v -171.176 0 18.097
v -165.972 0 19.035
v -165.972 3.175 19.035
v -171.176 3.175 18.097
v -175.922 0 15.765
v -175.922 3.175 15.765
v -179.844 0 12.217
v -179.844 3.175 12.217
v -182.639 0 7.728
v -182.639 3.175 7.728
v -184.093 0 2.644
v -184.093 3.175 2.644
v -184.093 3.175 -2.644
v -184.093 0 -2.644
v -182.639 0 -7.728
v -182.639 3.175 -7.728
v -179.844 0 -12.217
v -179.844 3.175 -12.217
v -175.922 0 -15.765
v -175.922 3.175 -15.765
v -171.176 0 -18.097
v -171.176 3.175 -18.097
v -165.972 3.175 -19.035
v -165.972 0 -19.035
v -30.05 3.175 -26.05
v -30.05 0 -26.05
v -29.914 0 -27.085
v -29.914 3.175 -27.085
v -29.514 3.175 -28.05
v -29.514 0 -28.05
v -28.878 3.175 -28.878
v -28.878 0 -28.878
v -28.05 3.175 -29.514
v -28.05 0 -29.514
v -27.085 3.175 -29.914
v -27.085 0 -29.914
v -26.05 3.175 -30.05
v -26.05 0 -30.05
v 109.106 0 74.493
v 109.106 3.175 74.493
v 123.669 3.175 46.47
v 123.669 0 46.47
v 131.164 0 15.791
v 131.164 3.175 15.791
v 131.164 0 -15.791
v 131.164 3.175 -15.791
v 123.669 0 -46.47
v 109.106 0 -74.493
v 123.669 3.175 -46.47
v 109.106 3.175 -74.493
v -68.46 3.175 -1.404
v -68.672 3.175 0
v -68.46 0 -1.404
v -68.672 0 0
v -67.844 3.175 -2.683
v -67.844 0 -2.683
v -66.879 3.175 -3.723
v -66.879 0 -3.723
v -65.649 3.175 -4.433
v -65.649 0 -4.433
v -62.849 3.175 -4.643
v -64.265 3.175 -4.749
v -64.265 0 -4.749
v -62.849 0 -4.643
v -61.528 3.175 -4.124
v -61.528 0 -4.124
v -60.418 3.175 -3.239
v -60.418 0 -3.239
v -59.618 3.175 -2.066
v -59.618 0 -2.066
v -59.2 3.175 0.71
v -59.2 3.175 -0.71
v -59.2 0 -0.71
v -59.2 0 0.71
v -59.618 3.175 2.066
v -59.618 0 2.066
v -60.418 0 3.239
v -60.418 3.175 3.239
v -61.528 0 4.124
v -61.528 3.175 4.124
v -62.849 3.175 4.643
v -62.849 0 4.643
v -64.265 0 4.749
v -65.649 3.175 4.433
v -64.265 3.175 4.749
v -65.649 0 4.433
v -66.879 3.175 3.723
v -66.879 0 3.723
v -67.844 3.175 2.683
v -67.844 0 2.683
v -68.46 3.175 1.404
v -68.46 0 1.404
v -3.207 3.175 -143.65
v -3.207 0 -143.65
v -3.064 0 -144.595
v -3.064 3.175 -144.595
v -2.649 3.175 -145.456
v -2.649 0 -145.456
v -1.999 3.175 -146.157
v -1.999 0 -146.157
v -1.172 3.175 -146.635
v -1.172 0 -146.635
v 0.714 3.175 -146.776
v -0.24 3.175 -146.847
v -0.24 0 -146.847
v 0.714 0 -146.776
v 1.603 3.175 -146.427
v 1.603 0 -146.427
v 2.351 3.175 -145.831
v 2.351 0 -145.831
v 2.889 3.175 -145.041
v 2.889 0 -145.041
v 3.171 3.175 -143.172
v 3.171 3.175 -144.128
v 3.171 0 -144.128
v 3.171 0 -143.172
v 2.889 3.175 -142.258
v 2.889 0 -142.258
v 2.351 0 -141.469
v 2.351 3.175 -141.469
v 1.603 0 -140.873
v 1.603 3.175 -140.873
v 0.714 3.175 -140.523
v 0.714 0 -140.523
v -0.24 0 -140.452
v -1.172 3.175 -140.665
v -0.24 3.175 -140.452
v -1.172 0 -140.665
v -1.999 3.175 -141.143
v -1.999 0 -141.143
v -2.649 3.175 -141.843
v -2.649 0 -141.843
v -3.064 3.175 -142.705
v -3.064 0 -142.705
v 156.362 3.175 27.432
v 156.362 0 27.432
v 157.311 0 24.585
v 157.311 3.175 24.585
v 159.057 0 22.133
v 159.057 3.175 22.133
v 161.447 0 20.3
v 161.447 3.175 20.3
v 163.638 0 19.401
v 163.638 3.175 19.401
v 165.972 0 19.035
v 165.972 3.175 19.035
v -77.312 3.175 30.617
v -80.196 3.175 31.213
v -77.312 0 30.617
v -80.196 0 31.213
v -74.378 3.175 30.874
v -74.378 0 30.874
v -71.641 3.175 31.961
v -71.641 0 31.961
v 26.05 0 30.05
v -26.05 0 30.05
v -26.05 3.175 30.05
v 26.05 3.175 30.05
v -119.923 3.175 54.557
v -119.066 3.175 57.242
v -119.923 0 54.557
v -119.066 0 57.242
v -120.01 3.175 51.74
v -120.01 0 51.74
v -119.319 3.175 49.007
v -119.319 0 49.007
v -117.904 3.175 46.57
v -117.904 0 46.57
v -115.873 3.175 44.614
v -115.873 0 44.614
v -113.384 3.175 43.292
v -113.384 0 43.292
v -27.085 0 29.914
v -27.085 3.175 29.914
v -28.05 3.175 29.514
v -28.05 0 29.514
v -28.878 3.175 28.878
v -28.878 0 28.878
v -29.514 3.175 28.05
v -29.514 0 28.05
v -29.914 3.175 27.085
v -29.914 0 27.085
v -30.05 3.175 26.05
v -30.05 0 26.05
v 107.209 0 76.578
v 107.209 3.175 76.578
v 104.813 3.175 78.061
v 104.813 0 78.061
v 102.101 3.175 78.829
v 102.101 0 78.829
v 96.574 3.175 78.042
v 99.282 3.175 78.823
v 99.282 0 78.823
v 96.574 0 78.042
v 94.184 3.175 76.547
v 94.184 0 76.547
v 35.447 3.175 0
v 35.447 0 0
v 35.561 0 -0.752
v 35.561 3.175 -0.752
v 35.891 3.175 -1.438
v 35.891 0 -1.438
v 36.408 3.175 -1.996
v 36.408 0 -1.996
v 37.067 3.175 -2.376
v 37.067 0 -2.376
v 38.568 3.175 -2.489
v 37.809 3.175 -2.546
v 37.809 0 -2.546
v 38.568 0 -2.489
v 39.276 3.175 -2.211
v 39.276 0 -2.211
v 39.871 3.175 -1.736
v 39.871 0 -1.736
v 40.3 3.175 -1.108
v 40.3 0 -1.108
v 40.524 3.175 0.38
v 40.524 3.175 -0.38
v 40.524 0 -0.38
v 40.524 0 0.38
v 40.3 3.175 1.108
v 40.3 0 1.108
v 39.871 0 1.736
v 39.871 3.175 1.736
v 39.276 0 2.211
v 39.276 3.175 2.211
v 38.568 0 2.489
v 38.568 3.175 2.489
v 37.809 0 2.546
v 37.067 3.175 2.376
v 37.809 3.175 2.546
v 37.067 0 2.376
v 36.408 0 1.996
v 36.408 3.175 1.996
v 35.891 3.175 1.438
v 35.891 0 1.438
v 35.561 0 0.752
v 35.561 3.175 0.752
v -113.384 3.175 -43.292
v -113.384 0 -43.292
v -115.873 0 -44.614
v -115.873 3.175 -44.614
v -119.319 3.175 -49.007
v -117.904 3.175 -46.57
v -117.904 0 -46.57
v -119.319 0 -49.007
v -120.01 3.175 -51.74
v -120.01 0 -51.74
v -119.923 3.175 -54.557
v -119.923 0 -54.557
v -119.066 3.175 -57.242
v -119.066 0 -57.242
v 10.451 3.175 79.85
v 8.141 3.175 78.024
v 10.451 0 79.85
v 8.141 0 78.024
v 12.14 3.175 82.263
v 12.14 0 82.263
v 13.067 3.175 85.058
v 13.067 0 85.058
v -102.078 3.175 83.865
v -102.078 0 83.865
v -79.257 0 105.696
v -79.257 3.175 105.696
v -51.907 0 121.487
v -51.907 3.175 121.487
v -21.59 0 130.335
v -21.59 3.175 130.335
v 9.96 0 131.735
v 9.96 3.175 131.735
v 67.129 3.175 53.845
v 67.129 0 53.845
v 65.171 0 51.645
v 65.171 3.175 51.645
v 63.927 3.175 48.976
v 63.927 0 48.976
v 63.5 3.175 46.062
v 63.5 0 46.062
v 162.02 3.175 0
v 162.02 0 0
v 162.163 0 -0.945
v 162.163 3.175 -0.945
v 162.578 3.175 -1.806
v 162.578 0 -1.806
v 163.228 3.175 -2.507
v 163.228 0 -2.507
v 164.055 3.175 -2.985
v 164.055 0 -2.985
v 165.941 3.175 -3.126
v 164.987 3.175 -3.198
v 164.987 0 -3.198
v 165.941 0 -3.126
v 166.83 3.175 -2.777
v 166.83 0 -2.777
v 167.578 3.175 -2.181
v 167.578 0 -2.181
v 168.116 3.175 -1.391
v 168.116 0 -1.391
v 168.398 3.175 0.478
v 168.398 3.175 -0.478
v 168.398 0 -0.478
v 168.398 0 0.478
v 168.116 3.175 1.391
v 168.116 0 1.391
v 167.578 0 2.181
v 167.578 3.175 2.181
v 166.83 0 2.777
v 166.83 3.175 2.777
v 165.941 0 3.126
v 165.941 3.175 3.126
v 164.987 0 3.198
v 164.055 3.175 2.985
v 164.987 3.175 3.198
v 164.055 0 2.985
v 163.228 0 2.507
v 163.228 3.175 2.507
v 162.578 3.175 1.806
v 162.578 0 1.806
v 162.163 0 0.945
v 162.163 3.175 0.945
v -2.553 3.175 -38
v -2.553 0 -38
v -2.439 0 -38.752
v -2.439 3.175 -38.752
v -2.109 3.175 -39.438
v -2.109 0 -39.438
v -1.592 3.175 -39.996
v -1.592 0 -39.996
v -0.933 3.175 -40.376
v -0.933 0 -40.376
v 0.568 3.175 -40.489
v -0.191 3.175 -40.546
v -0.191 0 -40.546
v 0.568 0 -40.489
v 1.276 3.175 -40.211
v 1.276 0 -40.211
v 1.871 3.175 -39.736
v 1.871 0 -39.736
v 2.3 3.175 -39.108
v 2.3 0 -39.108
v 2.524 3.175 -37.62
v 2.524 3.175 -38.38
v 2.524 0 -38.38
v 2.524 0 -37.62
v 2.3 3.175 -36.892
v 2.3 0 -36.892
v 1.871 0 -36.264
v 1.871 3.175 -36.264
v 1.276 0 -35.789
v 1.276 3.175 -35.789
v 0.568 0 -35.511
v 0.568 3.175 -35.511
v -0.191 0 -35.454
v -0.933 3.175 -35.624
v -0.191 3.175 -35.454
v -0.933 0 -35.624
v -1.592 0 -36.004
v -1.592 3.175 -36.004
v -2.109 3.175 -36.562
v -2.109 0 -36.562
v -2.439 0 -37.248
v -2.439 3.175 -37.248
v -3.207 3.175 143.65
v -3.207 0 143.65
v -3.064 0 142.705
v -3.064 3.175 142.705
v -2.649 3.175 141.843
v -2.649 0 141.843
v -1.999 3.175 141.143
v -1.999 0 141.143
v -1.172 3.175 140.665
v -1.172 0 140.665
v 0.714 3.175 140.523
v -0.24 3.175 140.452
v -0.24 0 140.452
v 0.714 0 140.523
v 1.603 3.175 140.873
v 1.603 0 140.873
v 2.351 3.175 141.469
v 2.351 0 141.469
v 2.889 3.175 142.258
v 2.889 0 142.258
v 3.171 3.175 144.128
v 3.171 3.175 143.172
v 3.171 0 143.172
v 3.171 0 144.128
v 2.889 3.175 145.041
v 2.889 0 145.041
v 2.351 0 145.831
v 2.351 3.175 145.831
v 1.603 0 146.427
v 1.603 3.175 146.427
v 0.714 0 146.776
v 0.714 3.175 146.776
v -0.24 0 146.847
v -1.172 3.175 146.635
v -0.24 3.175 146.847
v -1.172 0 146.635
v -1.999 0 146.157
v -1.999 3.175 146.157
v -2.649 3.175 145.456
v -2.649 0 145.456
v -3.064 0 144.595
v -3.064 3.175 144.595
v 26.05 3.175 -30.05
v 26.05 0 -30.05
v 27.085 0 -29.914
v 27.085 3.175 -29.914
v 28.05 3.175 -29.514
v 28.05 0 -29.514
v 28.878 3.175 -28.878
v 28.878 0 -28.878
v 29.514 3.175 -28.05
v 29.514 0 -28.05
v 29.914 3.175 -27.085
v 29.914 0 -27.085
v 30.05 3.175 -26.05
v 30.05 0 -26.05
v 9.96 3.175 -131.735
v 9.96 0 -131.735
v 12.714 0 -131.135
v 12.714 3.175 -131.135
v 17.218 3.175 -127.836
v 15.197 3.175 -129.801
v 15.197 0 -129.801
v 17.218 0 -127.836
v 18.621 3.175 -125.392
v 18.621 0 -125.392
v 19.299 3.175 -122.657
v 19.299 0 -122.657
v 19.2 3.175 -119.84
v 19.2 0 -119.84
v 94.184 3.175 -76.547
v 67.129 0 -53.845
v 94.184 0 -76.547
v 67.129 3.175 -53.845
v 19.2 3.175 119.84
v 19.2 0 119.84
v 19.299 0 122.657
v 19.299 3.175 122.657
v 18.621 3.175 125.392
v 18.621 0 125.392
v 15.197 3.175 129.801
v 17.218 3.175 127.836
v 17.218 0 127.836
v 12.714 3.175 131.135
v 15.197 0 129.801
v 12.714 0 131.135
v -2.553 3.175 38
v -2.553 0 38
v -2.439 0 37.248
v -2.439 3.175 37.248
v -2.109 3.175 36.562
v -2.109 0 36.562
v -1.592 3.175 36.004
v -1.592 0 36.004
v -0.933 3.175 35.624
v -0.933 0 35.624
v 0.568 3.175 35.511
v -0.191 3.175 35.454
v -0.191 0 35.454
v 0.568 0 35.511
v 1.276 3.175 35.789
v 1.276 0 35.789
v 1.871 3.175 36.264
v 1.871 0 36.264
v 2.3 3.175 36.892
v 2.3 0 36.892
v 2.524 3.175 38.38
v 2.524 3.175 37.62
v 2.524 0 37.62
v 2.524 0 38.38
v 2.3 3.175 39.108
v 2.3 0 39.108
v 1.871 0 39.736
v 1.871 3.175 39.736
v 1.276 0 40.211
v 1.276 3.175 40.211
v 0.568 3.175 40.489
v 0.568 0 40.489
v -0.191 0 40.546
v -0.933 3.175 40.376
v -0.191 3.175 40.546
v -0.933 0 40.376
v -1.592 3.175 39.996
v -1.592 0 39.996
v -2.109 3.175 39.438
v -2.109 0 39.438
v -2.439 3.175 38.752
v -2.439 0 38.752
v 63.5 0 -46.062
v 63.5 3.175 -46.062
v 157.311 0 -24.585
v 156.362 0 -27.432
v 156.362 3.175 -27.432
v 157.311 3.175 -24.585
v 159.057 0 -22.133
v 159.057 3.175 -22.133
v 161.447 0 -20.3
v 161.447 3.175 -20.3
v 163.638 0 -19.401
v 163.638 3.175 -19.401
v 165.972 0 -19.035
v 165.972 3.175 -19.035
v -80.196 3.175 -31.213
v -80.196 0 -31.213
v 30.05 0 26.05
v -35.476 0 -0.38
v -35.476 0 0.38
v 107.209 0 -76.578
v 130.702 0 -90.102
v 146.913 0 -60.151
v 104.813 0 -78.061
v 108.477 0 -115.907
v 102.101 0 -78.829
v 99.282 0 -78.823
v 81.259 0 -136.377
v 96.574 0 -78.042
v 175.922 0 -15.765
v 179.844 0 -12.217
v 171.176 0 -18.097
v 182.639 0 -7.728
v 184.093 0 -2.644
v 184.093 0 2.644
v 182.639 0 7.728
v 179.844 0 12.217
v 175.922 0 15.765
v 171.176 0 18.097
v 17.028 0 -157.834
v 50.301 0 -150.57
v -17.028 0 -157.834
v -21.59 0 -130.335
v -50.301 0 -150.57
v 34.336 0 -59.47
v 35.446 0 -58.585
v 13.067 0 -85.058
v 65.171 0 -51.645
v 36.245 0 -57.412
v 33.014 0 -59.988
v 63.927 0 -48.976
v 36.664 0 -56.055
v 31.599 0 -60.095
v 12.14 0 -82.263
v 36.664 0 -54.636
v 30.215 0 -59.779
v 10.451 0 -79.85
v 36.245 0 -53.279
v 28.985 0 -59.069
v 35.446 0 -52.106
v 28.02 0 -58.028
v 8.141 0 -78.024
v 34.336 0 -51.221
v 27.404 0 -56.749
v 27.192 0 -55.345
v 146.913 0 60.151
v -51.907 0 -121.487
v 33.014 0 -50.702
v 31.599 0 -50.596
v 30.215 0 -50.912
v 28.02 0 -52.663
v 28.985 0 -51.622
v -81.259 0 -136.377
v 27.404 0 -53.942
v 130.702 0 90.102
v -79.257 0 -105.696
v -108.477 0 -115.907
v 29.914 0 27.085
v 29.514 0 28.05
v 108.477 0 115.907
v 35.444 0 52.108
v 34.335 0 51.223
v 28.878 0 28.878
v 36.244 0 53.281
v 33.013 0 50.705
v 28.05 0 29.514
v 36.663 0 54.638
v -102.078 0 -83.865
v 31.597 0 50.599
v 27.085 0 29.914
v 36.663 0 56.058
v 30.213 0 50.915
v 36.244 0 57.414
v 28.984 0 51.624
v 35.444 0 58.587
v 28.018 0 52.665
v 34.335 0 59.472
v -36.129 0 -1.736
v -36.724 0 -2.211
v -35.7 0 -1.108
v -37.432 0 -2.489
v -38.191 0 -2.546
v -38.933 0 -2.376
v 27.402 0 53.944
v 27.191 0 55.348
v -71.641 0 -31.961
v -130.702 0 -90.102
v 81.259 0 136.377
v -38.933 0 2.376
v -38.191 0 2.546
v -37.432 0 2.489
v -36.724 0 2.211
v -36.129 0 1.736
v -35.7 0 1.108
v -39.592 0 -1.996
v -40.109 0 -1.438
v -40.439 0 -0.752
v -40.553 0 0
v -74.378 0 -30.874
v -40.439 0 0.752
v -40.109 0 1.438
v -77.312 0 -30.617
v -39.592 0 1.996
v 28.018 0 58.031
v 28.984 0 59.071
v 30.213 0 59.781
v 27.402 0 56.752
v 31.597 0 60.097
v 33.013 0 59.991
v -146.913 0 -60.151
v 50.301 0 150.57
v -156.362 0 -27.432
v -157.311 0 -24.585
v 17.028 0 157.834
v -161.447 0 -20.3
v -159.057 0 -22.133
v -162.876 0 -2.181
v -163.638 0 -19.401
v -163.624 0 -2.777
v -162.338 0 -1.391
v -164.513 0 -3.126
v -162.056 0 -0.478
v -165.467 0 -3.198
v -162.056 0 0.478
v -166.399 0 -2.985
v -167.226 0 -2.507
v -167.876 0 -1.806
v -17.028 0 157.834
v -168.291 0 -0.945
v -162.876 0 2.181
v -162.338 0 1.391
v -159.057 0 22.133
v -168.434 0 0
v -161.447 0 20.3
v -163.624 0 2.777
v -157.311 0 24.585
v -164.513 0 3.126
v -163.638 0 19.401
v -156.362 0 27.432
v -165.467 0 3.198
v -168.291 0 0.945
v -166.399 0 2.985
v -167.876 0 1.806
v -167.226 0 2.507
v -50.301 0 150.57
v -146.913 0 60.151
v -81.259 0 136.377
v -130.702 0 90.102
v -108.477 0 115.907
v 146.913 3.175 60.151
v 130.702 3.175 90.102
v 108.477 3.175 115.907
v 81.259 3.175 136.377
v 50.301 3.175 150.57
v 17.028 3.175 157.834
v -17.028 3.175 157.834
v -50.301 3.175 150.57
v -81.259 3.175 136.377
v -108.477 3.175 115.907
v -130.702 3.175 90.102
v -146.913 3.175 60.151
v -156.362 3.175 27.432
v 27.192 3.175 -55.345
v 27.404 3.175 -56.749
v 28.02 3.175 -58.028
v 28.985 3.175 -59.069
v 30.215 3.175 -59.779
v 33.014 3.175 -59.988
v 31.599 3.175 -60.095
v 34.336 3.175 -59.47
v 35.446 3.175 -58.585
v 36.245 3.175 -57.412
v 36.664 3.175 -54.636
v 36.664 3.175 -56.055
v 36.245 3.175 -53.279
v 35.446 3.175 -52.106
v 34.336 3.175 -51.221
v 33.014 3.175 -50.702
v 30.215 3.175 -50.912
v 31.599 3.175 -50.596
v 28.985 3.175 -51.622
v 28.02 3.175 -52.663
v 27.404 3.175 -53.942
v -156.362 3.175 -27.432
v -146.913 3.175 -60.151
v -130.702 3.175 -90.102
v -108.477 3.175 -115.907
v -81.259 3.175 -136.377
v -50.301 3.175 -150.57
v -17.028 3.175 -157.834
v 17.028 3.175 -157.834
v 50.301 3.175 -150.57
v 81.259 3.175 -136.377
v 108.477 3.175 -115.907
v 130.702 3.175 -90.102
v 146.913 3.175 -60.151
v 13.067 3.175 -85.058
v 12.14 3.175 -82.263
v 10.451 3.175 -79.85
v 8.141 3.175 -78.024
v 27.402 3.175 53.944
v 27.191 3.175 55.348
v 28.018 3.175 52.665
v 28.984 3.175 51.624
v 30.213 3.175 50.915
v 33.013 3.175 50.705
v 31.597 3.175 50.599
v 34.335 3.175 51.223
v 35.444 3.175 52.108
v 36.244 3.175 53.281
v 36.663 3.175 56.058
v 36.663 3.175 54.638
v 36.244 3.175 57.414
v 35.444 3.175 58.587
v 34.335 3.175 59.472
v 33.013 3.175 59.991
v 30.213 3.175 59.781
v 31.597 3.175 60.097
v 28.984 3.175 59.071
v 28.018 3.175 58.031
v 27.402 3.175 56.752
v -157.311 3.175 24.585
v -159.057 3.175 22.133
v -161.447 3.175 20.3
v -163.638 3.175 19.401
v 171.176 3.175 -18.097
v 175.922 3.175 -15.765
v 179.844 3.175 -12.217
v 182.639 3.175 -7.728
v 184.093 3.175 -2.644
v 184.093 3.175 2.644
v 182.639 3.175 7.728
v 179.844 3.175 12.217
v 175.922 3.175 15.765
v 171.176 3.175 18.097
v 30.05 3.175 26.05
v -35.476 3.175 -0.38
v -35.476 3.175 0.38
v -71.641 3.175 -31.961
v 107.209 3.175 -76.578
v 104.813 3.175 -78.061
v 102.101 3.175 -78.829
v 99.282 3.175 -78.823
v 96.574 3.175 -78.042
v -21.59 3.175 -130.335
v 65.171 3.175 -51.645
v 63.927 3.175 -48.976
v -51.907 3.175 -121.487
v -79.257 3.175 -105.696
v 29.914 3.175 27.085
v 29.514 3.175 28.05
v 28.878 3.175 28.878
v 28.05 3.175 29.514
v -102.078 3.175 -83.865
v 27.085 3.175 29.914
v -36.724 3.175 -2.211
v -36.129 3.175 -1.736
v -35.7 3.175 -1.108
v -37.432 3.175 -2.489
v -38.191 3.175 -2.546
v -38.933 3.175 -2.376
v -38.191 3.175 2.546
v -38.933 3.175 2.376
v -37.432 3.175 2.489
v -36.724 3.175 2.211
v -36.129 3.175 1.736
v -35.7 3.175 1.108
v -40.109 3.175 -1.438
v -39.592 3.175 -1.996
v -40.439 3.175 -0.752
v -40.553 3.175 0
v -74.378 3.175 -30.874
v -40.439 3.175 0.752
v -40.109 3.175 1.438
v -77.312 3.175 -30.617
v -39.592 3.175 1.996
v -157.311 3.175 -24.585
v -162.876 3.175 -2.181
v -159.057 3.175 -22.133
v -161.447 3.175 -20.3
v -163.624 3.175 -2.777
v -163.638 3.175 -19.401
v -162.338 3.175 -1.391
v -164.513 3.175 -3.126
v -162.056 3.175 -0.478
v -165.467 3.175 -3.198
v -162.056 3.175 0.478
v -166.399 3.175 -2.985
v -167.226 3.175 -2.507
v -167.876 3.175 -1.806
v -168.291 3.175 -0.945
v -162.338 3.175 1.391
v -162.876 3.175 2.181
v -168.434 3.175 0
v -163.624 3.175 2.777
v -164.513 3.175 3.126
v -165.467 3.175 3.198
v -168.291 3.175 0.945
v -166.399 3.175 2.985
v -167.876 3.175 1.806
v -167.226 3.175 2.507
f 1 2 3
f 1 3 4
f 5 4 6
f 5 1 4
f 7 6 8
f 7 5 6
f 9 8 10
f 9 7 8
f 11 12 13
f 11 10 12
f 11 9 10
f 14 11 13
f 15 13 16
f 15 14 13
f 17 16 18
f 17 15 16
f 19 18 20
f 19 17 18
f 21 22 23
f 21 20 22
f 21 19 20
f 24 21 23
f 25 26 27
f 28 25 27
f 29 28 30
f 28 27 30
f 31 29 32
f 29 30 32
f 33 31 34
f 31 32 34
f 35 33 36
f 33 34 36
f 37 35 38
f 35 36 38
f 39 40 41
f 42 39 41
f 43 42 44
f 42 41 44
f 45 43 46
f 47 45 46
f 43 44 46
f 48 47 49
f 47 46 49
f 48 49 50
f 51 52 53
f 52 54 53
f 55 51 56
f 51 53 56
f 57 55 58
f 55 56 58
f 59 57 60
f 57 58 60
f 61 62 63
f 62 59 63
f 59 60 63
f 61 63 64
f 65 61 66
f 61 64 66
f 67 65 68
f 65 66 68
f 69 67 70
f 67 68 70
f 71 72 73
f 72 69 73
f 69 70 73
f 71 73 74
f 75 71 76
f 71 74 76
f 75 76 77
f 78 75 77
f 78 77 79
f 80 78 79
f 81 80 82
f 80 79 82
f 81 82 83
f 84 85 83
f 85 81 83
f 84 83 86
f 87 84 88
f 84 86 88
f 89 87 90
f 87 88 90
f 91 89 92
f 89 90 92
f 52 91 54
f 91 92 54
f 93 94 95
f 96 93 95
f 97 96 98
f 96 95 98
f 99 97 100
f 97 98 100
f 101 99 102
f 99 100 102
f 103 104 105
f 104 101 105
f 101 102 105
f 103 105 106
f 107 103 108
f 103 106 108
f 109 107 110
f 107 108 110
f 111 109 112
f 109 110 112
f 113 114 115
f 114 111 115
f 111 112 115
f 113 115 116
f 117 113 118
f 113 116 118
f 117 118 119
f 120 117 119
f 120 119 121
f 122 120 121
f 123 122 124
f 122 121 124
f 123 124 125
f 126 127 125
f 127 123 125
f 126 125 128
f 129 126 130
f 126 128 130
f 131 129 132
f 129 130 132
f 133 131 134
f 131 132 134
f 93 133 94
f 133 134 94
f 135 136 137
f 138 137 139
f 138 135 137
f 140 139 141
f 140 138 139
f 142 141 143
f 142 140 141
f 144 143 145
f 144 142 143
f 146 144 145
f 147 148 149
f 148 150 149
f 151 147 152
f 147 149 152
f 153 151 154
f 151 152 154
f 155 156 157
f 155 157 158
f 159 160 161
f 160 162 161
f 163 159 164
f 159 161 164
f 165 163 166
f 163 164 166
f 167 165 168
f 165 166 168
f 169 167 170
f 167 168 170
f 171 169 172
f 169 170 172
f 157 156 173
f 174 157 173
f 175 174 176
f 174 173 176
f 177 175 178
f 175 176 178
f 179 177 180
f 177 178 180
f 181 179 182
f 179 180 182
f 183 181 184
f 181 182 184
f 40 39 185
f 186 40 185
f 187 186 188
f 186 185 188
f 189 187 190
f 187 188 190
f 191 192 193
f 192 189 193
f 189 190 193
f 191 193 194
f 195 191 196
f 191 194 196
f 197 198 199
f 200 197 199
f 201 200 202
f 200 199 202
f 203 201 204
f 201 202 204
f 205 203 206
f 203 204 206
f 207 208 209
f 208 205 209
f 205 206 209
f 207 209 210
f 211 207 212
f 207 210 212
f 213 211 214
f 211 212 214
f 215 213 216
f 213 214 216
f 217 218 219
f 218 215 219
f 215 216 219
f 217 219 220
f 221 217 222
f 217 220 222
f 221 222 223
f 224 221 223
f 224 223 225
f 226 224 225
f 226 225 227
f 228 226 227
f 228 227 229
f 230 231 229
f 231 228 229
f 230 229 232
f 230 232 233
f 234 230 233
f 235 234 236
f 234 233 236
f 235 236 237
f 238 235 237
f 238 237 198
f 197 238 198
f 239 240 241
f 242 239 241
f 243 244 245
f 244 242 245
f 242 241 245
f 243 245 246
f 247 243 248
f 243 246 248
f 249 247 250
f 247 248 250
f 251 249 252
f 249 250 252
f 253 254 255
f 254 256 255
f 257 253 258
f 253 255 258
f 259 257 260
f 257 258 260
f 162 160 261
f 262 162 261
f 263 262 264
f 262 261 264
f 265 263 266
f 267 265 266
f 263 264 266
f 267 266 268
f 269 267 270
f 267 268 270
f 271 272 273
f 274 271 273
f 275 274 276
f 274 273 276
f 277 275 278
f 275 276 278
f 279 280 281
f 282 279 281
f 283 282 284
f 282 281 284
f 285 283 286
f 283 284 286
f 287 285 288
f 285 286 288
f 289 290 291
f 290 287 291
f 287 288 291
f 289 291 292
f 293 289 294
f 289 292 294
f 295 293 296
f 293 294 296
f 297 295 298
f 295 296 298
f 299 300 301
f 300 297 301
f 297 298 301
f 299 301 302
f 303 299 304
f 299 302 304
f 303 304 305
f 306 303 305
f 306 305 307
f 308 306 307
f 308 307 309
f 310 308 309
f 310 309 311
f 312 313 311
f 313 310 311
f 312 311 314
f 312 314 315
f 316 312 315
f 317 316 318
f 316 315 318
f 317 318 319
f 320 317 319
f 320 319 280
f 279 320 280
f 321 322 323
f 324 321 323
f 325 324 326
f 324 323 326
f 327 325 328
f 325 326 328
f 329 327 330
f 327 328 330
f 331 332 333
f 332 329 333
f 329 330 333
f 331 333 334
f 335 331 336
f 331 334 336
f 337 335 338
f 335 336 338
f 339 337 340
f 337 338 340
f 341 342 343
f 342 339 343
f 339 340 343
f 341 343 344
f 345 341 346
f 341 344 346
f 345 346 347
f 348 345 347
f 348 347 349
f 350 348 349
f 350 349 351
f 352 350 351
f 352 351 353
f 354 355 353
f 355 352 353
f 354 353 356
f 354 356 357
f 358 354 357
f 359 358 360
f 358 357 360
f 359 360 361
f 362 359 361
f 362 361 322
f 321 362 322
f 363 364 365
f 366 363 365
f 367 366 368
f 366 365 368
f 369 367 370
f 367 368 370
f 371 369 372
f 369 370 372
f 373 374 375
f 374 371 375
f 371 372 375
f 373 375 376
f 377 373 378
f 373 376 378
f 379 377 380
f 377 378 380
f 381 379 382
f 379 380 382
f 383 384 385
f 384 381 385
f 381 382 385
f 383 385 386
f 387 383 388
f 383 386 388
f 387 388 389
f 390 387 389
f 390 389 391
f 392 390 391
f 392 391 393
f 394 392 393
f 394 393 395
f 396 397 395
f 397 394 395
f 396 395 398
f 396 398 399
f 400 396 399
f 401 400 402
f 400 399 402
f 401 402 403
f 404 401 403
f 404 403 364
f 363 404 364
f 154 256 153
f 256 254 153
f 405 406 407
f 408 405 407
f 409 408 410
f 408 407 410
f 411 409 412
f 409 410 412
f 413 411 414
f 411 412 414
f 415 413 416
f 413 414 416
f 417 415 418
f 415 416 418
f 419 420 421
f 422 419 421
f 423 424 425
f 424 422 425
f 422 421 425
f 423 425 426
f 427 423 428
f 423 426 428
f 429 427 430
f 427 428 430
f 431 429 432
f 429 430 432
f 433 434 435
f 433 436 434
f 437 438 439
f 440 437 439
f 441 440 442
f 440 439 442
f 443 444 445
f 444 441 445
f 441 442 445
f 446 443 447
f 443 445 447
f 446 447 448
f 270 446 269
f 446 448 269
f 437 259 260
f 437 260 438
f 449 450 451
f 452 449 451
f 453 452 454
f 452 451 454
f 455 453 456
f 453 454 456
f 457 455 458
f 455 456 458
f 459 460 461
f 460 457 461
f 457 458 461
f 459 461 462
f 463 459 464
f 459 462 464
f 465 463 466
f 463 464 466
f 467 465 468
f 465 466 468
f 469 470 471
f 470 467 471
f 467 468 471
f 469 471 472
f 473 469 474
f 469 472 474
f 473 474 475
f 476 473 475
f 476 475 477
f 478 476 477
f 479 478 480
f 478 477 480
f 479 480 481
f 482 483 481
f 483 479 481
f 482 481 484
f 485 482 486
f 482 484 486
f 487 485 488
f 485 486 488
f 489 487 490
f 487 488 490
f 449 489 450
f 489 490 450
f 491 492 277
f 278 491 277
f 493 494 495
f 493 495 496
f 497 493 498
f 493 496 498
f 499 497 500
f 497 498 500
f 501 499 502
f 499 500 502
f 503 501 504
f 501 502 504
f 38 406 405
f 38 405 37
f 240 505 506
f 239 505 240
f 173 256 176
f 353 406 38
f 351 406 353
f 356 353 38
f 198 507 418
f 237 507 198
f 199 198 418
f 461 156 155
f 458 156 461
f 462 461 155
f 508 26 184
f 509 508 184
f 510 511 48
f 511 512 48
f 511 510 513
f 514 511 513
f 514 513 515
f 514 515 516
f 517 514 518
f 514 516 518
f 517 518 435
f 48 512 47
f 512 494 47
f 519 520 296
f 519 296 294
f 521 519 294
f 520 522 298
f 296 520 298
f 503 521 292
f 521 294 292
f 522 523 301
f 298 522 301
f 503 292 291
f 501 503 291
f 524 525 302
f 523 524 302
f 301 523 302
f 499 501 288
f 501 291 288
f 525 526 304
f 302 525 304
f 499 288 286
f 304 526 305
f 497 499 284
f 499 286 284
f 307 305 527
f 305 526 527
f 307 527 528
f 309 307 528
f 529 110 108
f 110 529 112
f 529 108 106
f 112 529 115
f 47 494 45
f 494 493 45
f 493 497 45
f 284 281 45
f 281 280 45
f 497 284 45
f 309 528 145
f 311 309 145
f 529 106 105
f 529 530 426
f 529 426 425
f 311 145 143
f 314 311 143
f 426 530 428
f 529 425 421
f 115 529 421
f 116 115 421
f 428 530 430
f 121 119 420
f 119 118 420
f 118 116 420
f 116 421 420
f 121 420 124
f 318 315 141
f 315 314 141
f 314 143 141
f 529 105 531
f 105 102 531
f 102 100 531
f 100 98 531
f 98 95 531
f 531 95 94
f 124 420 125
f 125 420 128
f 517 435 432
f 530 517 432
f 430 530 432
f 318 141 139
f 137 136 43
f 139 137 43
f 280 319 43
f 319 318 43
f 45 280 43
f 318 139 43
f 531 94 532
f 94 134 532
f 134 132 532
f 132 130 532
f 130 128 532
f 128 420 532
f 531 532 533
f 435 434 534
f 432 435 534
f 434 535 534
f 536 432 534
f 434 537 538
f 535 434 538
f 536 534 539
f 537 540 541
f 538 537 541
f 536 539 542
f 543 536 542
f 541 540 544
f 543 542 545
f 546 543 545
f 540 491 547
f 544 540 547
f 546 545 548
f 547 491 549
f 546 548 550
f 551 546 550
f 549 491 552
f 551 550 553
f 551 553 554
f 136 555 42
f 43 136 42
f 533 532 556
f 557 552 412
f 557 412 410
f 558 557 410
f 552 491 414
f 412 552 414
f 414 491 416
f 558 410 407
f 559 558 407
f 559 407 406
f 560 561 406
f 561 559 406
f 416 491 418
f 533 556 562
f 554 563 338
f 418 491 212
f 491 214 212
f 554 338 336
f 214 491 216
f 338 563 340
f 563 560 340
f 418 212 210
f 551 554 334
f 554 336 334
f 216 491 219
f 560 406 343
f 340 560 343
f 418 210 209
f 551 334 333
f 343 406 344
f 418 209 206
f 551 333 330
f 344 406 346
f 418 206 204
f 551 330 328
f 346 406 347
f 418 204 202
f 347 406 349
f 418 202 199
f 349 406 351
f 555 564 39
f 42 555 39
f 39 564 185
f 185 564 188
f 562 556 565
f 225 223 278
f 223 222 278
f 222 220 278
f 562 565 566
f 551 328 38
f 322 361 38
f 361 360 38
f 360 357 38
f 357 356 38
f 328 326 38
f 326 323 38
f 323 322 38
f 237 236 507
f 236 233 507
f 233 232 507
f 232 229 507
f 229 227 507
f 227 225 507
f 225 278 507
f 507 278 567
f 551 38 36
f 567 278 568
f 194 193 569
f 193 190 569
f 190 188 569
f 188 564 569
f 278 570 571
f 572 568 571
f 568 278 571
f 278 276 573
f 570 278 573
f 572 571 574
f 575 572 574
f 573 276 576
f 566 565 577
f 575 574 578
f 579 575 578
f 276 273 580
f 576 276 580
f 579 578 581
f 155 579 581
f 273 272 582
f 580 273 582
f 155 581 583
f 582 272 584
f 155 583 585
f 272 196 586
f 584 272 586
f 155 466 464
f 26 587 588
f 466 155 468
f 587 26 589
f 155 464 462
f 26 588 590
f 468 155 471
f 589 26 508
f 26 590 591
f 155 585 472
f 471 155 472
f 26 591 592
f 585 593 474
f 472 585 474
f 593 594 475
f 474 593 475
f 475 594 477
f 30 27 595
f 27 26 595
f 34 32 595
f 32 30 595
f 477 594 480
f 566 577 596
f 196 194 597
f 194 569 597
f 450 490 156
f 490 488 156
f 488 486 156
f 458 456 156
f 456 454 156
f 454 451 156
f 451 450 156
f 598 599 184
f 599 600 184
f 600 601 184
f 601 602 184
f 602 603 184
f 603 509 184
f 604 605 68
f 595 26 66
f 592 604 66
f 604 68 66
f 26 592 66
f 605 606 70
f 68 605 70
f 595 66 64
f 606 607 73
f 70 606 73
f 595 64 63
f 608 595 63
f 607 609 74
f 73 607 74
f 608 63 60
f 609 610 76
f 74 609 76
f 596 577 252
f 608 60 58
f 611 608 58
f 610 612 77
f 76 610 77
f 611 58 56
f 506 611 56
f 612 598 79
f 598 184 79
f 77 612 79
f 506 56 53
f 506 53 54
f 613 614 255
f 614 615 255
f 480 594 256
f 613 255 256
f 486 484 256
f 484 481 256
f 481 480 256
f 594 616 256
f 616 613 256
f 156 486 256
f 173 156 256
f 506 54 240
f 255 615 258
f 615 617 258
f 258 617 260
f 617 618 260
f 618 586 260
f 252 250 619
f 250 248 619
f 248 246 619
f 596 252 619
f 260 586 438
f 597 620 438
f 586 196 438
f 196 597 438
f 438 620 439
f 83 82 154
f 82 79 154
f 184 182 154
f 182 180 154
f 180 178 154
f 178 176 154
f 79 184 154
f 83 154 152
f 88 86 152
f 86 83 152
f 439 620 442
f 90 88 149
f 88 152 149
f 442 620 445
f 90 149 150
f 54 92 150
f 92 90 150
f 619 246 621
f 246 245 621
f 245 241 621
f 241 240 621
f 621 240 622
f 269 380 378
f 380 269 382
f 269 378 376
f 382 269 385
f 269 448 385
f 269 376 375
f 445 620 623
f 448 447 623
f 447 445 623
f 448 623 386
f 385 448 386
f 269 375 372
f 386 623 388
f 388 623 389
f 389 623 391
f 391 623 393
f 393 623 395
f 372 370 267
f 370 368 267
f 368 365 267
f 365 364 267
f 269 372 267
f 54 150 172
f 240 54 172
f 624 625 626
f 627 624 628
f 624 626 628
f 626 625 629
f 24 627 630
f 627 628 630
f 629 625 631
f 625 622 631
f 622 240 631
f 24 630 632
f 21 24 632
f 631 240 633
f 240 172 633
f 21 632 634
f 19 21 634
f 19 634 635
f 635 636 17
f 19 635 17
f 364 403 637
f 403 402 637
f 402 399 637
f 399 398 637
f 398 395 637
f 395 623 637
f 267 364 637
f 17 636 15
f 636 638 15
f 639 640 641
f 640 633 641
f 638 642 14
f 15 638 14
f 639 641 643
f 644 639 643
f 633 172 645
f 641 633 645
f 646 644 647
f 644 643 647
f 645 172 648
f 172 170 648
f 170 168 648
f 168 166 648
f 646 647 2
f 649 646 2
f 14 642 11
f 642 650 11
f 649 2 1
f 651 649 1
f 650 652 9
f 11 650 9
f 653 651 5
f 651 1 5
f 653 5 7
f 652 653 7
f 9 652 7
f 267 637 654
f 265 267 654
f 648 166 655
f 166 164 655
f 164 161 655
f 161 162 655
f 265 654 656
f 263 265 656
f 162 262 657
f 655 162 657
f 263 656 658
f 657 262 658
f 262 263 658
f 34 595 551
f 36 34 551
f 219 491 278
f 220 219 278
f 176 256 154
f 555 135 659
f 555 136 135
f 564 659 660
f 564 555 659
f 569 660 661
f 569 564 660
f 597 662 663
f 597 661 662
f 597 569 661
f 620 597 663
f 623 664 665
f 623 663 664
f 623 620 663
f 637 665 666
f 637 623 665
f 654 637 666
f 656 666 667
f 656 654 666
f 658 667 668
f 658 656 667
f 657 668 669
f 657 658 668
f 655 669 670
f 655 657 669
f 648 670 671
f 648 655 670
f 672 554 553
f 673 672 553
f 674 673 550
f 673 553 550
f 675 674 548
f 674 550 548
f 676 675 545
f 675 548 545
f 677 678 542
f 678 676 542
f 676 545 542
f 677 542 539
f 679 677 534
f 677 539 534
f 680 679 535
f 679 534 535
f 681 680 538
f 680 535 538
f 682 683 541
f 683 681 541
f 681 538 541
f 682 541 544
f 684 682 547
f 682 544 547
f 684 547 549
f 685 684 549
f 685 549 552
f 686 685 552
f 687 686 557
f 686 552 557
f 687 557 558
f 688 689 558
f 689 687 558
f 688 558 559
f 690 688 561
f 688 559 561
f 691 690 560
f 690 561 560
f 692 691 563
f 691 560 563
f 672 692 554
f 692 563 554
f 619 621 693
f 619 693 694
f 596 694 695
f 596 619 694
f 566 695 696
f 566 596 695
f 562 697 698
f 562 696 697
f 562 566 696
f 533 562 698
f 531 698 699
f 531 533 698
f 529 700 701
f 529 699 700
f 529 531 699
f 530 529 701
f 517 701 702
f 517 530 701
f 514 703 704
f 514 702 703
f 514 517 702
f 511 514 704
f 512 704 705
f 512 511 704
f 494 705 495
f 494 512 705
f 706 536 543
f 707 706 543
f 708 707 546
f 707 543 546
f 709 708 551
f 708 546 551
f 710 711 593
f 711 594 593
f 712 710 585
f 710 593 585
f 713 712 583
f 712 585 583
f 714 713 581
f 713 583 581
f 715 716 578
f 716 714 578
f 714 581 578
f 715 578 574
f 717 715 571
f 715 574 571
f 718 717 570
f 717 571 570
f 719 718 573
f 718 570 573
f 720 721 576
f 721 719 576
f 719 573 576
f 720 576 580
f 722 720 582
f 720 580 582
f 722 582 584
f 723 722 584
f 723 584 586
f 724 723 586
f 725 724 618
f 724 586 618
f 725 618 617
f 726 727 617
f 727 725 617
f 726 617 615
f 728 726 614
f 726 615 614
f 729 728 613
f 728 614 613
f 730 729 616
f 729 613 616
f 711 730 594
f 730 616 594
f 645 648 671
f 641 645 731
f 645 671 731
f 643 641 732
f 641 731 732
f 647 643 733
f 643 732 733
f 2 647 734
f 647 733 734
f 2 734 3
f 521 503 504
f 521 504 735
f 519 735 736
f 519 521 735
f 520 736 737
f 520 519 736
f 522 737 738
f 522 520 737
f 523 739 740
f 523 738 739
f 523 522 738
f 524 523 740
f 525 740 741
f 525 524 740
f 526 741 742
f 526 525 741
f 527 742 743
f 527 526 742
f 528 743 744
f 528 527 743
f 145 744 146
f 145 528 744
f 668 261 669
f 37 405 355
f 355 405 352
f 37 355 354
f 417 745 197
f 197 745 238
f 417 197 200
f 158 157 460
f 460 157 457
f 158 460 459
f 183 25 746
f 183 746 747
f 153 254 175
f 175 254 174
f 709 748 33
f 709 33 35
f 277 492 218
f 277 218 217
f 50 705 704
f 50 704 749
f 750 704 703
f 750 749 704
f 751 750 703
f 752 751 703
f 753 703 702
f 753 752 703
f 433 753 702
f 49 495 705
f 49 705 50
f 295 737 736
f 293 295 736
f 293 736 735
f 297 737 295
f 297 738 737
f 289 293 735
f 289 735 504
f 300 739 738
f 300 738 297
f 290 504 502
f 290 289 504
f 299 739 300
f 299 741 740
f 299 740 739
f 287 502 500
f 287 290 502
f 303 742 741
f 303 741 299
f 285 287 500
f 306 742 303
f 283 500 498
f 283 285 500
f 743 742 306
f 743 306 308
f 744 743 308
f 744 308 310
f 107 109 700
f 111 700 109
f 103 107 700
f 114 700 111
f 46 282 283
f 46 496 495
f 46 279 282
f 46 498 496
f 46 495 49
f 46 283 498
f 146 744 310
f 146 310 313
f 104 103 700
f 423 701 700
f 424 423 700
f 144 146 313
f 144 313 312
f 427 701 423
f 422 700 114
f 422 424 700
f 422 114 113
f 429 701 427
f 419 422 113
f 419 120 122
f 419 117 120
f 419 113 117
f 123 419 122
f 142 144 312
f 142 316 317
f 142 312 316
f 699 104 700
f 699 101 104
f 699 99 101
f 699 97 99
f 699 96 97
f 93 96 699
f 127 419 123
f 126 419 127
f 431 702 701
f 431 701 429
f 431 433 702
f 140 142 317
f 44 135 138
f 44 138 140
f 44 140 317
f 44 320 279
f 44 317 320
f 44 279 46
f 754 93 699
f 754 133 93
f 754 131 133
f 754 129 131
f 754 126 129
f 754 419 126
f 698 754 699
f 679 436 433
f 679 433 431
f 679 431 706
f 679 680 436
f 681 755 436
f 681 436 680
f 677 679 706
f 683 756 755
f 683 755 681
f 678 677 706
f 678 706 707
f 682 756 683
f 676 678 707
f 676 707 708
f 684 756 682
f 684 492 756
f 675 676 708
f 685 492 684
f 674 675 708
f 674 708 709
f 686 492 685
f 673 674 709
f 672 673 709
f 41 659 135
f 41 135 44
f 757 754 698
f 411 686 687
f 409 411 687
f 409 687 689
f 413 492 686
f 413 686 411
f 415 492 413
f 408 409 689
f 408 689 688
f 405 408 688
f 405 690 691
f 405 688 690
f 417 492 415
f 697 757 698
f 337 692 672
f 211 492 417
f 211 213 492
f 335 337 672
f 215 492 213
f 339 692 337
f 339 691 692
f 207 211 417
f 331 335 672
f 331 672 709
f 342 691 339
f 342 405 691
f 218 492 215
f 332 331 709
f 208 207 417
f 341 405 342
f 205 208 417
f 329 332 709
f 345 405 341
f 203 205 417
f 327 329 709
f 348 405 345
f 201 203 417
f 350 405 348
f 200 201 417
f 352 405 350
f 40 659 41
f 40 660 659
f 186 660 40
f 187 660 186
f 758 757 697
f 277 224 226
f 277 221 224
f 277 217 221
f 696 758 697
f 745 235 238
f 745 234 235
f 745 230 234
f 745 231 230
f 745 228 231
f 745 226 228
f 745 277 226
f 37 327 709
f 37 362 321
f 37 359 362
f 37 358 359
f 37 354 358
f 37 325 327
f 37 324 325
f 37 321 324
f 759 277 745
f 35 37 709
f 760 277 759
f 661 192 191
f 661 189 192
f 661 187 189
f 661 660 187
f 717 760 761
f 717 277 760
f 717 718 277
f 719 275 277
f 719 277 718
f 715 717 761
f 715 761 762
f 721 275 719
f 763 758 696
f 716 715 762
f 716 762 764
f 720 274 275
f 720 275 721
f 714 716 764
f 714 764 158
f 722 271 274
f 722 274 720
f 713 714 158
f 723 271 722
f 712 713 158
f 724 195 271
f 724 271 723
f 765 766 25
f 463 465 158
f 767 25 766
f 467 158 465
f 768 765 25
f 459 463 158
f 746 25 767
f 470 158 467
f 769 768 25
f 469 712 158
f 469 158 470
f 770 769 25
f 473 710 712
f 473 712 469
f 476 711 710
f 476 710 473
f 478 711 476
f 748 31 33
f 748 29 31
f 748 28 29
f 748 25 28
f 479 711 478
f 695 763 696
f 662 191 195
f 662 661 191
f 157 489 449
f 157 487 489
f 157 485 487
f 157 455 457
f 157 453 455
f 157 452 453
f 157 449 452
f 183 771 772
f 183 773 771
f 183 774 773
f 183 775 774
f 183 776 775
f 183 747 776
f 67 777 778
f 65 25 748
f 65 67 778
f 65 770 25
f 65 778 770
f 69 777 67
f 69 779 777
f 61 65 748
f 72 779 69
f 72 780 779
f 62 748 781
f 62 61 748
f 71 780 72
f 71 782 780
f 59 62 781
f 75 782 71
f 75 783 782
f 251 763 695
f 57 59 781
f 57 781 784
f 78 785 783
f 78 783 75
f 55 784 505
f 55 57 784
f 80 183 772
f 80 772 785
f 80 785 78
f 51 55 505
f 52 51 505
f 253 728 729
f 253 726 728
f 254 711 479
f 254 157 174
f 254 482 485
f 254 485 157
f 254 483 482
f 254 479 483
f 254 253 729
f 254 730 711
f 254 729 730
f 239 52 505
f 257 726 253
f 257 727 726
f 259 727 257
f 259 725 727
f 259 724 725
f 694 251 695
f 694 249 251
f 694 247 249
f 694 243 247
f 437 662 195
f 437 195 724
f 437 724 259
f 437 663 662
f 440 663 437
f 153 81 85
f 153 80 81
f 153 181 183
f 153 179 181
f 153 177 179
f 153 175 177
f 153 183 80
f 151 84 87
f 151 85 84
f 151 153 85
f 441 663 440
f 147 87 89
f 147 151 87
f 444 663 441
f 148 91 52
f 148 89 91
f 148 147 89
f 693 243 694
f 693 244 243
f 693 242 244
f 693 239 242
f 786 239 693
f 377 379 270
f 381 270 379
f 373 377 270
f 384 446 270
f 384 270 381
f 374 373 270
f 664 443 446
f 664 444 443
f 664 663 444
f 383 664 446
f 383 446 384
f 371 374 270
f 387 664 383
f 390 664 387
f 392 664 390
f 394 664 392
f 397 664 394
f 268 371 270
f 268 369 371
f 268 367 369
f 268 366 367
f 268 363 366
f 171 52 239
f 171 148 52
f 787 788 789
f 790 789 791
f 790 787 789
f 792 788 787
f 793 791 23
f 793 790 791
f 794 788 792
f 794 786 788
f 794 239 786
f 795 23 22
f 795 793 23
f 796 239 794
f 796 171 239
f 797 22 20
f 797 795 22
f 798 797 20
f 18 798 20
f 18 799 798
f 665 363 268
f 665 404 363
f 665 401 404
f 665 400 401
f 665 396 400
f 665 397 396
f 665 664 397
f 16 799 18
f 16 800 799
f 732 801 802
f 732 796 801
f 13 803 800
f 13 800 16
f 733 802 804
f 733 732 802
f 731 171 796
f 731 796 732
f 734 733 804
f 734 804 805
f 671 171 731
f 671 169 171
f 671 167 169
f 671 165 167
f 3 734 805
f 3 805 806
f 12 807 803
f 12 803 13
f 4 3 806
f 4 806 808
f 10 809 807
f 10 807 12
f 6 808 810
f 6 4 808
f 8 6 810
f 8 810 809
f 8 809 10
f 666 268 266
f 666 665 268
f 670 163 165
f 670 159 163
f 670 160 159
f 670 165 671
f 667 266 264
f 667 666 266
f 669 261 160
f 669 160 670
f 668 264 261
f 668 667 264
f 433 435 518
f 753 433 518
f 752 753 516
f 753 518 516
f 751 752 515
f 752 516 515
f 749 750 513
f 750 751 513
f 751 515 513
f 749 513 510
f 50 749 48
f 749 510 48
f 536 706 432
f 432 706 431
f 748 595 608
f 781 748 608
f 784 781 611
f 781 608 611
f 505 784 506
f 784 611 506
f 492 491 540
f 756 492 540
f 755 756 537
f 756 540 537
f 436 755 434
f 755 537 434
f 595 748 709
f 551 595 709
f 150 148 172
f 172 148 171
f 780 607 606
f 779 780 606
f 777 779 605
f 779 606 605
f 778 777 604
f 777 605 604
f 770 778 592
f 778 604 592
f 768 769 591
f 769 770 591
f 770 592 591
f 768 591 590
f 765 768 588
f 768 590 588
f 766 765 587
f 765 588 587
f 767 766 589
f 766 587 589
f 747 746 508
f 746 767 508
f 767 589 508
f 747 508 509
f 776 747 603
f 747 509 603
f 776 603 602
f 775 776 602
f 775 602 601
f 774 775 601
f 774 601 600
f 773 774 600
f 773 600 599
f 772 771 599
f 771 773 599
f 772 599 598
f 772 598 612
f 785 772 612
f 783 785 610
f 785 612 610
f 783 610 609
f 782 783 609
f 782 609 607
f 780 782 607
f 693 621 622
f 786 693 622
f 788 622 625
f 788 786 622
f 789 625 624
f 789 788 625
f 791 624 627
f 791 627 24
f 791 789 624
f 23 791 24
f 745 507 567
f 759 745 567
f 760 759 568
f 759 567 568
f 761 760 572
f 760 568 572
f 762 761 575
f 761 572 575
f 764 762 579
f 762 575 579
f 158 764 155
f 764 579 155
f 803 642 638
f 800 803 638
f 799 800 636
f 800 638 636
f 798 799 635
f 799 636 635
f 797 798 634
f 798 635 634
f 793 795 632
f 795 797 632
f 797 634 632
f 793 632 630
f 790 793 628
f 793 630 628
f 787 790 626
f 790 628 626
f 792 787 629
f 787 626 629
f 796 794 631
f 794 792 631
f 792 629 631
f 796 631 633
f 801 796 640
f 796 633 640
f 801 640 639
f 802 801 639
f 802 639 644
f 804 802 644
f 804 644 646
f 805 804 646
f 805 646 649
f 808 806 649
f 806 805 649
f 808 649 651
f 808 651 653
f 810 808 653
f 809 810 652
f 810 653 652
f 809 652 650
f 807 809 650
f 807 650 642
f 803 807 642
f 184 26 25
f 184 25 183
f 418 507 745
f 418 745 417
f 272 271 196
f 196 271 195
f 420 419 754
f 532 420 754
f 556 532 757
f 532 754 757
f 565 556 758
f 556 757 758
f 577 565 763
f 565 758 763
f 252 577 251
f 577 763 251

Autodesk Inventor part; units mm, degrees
ref_plane "YZ Plane" through (0, 0, 0) normal (1, 0, 0) x (0, 1, 0)
ref_plane "XZ Plane" through (0, 0, 0) normal (0, 1, 0) x (-1, 0, 0)
ref_plane "XY Plane" through (0, 0, 0) normal (0, 0, 1) x (1, 0, 0)
sketch "Sketch1" plane through (0, 0, 0) normal (0, 1, 0) x (-1, 0, 0)
  circle A0 centre (0, 0) radius 158.75
  line L0 (26.05, 30.05) -> (-26.05, 30.05)
  line L1 (-30.05, 26.05) -> (-30.05, -26.05)
  line L2 (-26.05, -30.05) -> (26.05, -30.05)
  line L3 (30.05, -26.05) -> (30.05, 26.05)
  arc A1 (30.05, 26.05) -> (26.05, 30.05) centre (26.05, 26.05) ccw
  arc A2 (26.05, -30.05) -> (30.05, -26.05) centre (26.05, -26.05) ccw
  arc A3 (-30.05, -26.05) -> (-26.05, -30.05) centre (-26.05, -26.05) ccw
  arc A4 (-26.05, 30.05) -> (-30.05, 26.05) centre (-26.05, 26.05) ccw
  circle A5 centre (38, 0) radius 2.5527
  circle A6 centre (0, -38) radius 2.5527
  circle A7 centre (-38, 0) radius 2.5527
  circle A8 centre (0, 38) radius 2.5527
  circle A9 centre (63.9092, 0) radius 4.7625
  circle A10 centre (-31.9546, -55.3454) radius 4.7625
  circle A11 centre (0, 0) radius 63.9092 construction
  circle A12 centre (0, 143.6497) radius 3.2067
  circle A13 centre (0, -143.6497) radius 3.2067
  line L4 (157.6029, 19.05) -> (165.227, 19.05)
  line L5 (165.227, 19.05) -> (165.227, -19.05) construction
  line L6 (165.227, -19.05) -> (157.6029, -19.05)
  line L7 (157.6029, -17.4578) -> (157.6029, 19.05) construction
  arc A14 (165.227, -19.05) -> (165.227, 19.05) centre (165.227, 0) ccw
  circle A15 centre (165.227, 0) radius 3.2067
  line L8 (0, -158.75) -> (0, 158.75) construction
  line L9 (-157.6029, 19.05) -> (-165.227, 19.05)
  line L10 (-165.227, -19.05) -> (-157.6029, -19.05)
  arc A16 (-165.227, 19.05) -> (-165.227, -19.05) centre (-165.227, 0) ccw
  circle A17 centre (-165.227, 0) radius 3.2067
  circle A18 centre (-31.9533, 55.3478) radius 4.7625
  point P0 (30.05, 30.05)
  point P1 (-30.05, 30.05)
  point P2 (30.05, -30.05)
  dimension "d0" = 317.5
  dimension "d1" = 30.05
  dimension "d2" = 60.1
  dimension "d3" = 60.1
  dimension "d4" = 30.05
  dimension "d5" = 4
  dimension "d6" = 4
  dimension "d7" = 5.1054
  dimension "d8" = 5.1054
  dimension "d9" = 5.1054
  dimension "d10" = 5.1054
  dimension "d11" = 76
  dimension "d12" = 38
  dimension "d13" = 76
  dimension "d14" = 38
  dimension "d15" = 9.525
  dimension "d17" = 110.6932
  dimension "d20" = 9.525
  dimension "d24" = 6.4135
  dimension "d25" = 6.4135
  dimension "d26" = 287.2994
  dimension "d27" = 143.6497
  dimension "d30" = 38.1
  dimension "d31" = 6.4135
  dimension "d33" = 330.454
  dimension "d38" = 110.6932
  dimension "d39" = 110.6932
  dimension "d41" = 127.8184
extrude "Extrusion1" add sketch "Sketch1" along normal blind 3.175
fillet "Fillet1" radius 10.16 4 edges at (-157.6029, 1.5875, 19.05) (-157.6029, 1.5875, -19.05) (157.6029, 1.5875, -19.05) (157.6029, 1.5875, 19.05)
sketch "Sketch2" plane through (0, 3.175, 0) normal (0, 1, 0) x (1, 0, 0)
  line L0 (63.5, 50.8) -> (102.4151, 83.4536)
  line L1 (63.5, 50.8) -> (63.5, -50.8)
  line L2 (63.5, -50.8) -> (102.4151, -83.4536)
  arc A0 (102.4151, -83.4536) -> (102.4151, 83.4536) centre (0, 0) ccw
  line L3 (-75.7441, 29.5926) -> (-123.4805, 46.9672)
  line L4 (12.2441, 80.3926) -> (21.0654, 130.4208)
  line L5 (-75.7441, 29.5926) -> (12.2441, 80.3926)
  arc A1 (21.0654, 130.4208) -> (-123.4805, 46.9672) centre (0, 0) ccw
  line L6 (12.2441, -80.3926) -> (21.0654, -130.4208)
  line L7 (-75.7441, -29.5926) -> (-123.4805, -46.9672)
  line L8 (12.2441, -80.3926) -> (-75.7441, -29.5926)
  arc A2 (-123.4805, -46.9672) -> (21.0654, -130.4208) centre (0, 0) ccw
  point P0 (0, 0)
  dimension "d42" = 101.6
  dimension "d43" = 50.8
  dimension "d44" = 130
  dimension "d45" = 130
  dimension "d46" = 50.8
  dimension "d47" = 50.8
  dimension "d48" = 63.5
  dimension "d49" = 0
  dimension "d52" = 360
extrude "Extrusion2" cut sketch "Sketch2" against normal blind 6.35
fillet "Fillet2" radius 10.16 6 edges at (-123.4805, 1.5875, 46.9672) (21.0654, 1.5875, -130.4208) (102.4151, 1.5875, -83.4536) (21.0654, 1.5875, 130.4208) (102.4151, 1.5875, 83.4536) (-123.4805, 1.5875, -46.9672)
fillet "Fillet3" radius 10.16 6 edges at (-75.7441, 1.5875, -29.5926) (63.5, 1.5875, -50.8) (12.2441, 1.5875, 80.3926) (-75.7441, 1.5875, 29.5926) (63.5, 1.5875, 50.8) (12.2441, 1.5875, -80.3926)
sketch "Sketch3" plane through (0, 3.175, 0) normal (0, 1, 0) x (1, 0, 0)
  arc A0 (156.3619, 27.432) -> (-156.3619, 27.432) centre (0, 0) ccw projected
  line L0 (82.2664, 135.7711) -> (76.6274, 126.5262)
  line L1 (71.6492, 125.9572) -> (67.3261, 130.3685)
  line L2 (62.348, 129.7996) -> (52.2012, 113.1643)
  line L3 (54.9118, 108.336) -> (59.8766, 108.336)
  line L4 (62.5872, 103.5077) -> (59.6212, 98.6449)
  line L5 (62.1502, 93.8218) -> (68.5548, 93.4551)
  line L6 (70.903, 88.3667) -> (56.7738, 69.7364)
  line L7 (51.3067, 70.4499) -> (48.2668, 77.8597)
  line L8 (43.6958, 79.3771) -> (21.3897, 65.9934)
  line L9 (19.9367, 64.015) -> (15.5672, 45.89)
  line L10 (18.312, 41.9894) -> (42.8589, 39.3314)
  line L11 (45.5063, 35.1047) -> (41.1925, 23.0559)
  line L12 (39.4084, 21.1887) -> (30.05, 17.3494)
  line L13 (30.05, 26.05) -> (30.05, -26.05) projected
  arc A1 (71.6492, 125.9572) -> (76.6274, 126.5262) centre (73.9169, 128.1795) ccw
  arc A2 (67.3261, 130.3685) -> (62.348, 129.7996) centre (65.0585, 128.1462) ccw
  arc A3 (52.2012, 113.1643) -> (54.9118, 108.336) centre (54.9118, 111.511) ccw
  arc A4 (70.903, 88.3667) -> (68.5548, 93.4551) centre (68.3733, 90.2853) ccw
  arc A5 (62.5872, 103.5077) -> (59.8766, 108.336) centre (59.8766, 105.161) ccw
  arc A6 (51.3067, 70.4499) -> (56.7738, 69.7364) centre (54.2441, 71.655) ccw
  arc A7 (48.2668, 77.8597) -> (43.6958, 79.3771) centre (45.3294, 76.6546) ccw
  arc A8 (21.3897, 65.9934) -> (19.9367, 64.015) centre (23.0232, 63.2709) ccw
  arc A9 (15.5672, 45.89) -> (18.312, 41.9894) centre (18.6538, 45.1459) ccw
  arc A10 (45.5063, 35.1047) -> (42.8589, 39.3314) centre (42.5171, 36.1749) ccw
  arc A11 (39.4084, 21.1887) -> (41.1925, 23.0559) centre (38.2034, 24.1261) ccw
  arc A12 (59.6212, 98.6449) -> (62.1502, 93.8218) centre (62.3317, 96.9916) ccw
  line L14 (-157.7126, 3.3351) -> (-147.8886, 3.0982)
  line L15 (-144.9068, -0.9286) -> (-146.5655, -6.8781)
  line L16 (-143.5837, -10.9049) -> (-124.1038, -11.3746)
  line L17 (-121.2776, -6.613) -> (-123.76, -2.3133)
  arc A13 (-120.9339, 2.4483) -> (-123.76, -2.3133) centre (-121.0104, -0.7258) ccw
  arc A14 (-124.1038, -11.3746) -> (-121.2776, -6.613) centre (-124.0272, -8.2005) ccw
  arc A15 (-144.9068, -0.9286) -> (-147.8886, 3.0982) centre (-147.9651, -0.0759) ccw
  arc A16 (-146.5655, -6.8781) -> (-143.5837, -10.9049) centre (-143.5072, -7.7308) ccw
  line L18 (-120.9339, 2.4483) -> (-115.2396, 2.311)
  line L19 (-112.3272, 6.9128) -> (-115.2119, 12.6427)
  line L20 (-111.9793, 17.2205) -> (-88.7805, 14.2994)
  line L21 (-86.6648, 9.2079) -> (-91.5618, 2.8704)
  arc A17 (-111.9793, 17.2205) -> (-115.2119, 12.6427) centre (-112.376, 14.0704) ccw
  arc A18 (-115.2396, 2.311) -> (-112.3272, 6.9128) centre (-115.1631, 5.4851) ccw
  arc A19 (-91.5618, 2.8704) -> (-90.5905, -1.8469) centre (-89.0495, 0.9291) ccw
  arc A20 (-86.6648, 9.2079) -> (-88.7805, 14.2994) centre (-89.1771, 11.1492) ccw
  line L22 (-90.5905, -1.8469) -> (-67.8469, -14.4727)
  line L23 (-65.4069, -14.7418) -> (-47.5255, -9.4634)
  line L24 (-45.5199, -5.136) -> (-55.4915, 17.4512)
  line L25 (-53.1547, 21.8573) -> (-40.5633, 24.1458)
  line L26 (-38.0542, 23.5343) -> (-30.05, 17.3494)
  arc A21 (-67.8469, -14.4727) -> (-65.4069, -14.7418) centre (-66.3058, -11.6967) ccw
  arc A22 (-53.1547, 21.8573) -> (-55.4915, 17.4512) centre (-52.5869, 18.7334) ccw
  arc A23 (-47.5255, -9.4634) -> (-45.5199, -5.136) centre (-48.4244, -6.4183) ccw
  arc A24 (-38.0542, 23.5343) -> (-40.5633, 24.1458) centre (-39.9955, 21.022) ccw
  line L27 (76.448, -139.1304) -> (71.2612, -129.6244)
  line L28 (73.2575, -125.0287) -> (79.2394, -123.4904)
  line L29 (81.2357, -118.8947) -> (71.9026, -101.7897)
  line L30 (66.3658, -101.723) -> (63.8834, -106.0227)
  arc A25 (58.3467, -105.9559) -> (63.8834, -106.0227) centre (61.1338, -104.4352) ccw
  arc A26 (71.9026, -101.7897) -> (66.3658, -101.723) centre (69.1155, -103.3105) ccw
  arc A27 (73.2575, -125.0287) -> (71.2612, -129.6244) centre (74.0483, -128.1036) ccw
  arc A28 (79.2394, -123.4904) -> (81.2357, -118.8947) centre (78.4486, -120.4155) ccw
  line L31 (58.3467, -105.9559) -> (55.6184, -100.9559)
  line L32 (50.177, -100.7346) -> (46.6571, -106.0977)
  line L33 (41.0763, -105.5872) -> (32.0066, -84.0358)
  line L34 (35.3581, -79.6578) -> (43.2951, -80.7301)
  arc A29 (41.0763, -105.5872) -> (46.6571, -106.0977) centre (44.0027, -104.3556) ccw
  arc A30 (55.6184, -100.9559) -> (50.177, -100.7346) centre (52.8313, -102.4767) ccw
  arc A31 (43.2951, -80.7301) -> (46.8947, -77.5303) centre (43.7201, -77.5837) ccw
  arc A32 (35.3581, -79.6578) -> (32.0066, -84.0358) centre (34.933, -82.8043) ccw
  line L35 (46.8947, -77.5303) -> (46.4571, -51.5208)
  line L36 (45.4703, -49.2732) -> (31.9583, -36.4266)
  line L37 (27.2079, -36.8534) -> (12.6326, -56.7826)
  line L38 (7.6484, -56.9619) -> (-0.6292, -47.2018)
  line L39 (-1.3542, -44.7231) -> (0, -34.6988)
  arc A33 (46.4571, -51.5208) -> (45.4703, -49.2732) centre (43.2826, -51.5742) ccw
  arc A34 (7.6484, -56.9619) -> (12.6326, -56.7826) centre (10.0698, -54.9083) ccw
  arc A35 (31.9583, -36.4266) -> (27.2079, -36.8534) centre (29.7706, -38.7277) ccw
  arc A36 (-1.3542, -44.7231) -> (-0.6292, -47.2018) centre (1.7922, -45.1481) ccw
  line L40 (-30.05, -26.05) -> (-30.05, 26.05) projected
  line L41 (0, -34.6988) -> (0.628, -30.05)
  line L42 (26.05, -30.05) -> (-26.05, -30.05) projected
  line L43 (-159.5209, 3.9541) -> (-175.7168, 15.9018)
  arc A37 (-165.9718, 19.0354) -> (-165.9718, -19.0354) centre (-165.227, 0) ccw projected
  arc A38 (-159.5209, 3.9541) -> (-157.7126, 3.3351) centre (-157.6361, 6.5092) ccw
  point P0 (65.5323, 108.336)
  point P1 (56.8639, 94.1245)
  point P2 (-158.7145, 3.3592)
  point P3 (-126.5879, 2.5846)
  point P4 (-109.9462, 2.1833)
  point P5 (61.0556, -110.9206)
  point P6 (53.0823, -96.3078)
  dimension "d58" = 3.175
  dimension "d61" = 360
  dimension "d63" = 3.175
split "Split5" [suppressed]
split "Split8" [suppressed]
split "Split9" [suppressed]
combine "Combine1" [suppressed]
feature "Move Body1" [suppressed]
feature "Move Body2" [suppressed]
feature "Move Body3" [suppressed]
feature "Move Body4" [suppressed]
feature "Move Body5" [suppressed]
equation "\"d24\" = d25"
equation "\"d25\" = d31"
equation "\"d38\" = d17"
equation "\"d39\" = d17"
